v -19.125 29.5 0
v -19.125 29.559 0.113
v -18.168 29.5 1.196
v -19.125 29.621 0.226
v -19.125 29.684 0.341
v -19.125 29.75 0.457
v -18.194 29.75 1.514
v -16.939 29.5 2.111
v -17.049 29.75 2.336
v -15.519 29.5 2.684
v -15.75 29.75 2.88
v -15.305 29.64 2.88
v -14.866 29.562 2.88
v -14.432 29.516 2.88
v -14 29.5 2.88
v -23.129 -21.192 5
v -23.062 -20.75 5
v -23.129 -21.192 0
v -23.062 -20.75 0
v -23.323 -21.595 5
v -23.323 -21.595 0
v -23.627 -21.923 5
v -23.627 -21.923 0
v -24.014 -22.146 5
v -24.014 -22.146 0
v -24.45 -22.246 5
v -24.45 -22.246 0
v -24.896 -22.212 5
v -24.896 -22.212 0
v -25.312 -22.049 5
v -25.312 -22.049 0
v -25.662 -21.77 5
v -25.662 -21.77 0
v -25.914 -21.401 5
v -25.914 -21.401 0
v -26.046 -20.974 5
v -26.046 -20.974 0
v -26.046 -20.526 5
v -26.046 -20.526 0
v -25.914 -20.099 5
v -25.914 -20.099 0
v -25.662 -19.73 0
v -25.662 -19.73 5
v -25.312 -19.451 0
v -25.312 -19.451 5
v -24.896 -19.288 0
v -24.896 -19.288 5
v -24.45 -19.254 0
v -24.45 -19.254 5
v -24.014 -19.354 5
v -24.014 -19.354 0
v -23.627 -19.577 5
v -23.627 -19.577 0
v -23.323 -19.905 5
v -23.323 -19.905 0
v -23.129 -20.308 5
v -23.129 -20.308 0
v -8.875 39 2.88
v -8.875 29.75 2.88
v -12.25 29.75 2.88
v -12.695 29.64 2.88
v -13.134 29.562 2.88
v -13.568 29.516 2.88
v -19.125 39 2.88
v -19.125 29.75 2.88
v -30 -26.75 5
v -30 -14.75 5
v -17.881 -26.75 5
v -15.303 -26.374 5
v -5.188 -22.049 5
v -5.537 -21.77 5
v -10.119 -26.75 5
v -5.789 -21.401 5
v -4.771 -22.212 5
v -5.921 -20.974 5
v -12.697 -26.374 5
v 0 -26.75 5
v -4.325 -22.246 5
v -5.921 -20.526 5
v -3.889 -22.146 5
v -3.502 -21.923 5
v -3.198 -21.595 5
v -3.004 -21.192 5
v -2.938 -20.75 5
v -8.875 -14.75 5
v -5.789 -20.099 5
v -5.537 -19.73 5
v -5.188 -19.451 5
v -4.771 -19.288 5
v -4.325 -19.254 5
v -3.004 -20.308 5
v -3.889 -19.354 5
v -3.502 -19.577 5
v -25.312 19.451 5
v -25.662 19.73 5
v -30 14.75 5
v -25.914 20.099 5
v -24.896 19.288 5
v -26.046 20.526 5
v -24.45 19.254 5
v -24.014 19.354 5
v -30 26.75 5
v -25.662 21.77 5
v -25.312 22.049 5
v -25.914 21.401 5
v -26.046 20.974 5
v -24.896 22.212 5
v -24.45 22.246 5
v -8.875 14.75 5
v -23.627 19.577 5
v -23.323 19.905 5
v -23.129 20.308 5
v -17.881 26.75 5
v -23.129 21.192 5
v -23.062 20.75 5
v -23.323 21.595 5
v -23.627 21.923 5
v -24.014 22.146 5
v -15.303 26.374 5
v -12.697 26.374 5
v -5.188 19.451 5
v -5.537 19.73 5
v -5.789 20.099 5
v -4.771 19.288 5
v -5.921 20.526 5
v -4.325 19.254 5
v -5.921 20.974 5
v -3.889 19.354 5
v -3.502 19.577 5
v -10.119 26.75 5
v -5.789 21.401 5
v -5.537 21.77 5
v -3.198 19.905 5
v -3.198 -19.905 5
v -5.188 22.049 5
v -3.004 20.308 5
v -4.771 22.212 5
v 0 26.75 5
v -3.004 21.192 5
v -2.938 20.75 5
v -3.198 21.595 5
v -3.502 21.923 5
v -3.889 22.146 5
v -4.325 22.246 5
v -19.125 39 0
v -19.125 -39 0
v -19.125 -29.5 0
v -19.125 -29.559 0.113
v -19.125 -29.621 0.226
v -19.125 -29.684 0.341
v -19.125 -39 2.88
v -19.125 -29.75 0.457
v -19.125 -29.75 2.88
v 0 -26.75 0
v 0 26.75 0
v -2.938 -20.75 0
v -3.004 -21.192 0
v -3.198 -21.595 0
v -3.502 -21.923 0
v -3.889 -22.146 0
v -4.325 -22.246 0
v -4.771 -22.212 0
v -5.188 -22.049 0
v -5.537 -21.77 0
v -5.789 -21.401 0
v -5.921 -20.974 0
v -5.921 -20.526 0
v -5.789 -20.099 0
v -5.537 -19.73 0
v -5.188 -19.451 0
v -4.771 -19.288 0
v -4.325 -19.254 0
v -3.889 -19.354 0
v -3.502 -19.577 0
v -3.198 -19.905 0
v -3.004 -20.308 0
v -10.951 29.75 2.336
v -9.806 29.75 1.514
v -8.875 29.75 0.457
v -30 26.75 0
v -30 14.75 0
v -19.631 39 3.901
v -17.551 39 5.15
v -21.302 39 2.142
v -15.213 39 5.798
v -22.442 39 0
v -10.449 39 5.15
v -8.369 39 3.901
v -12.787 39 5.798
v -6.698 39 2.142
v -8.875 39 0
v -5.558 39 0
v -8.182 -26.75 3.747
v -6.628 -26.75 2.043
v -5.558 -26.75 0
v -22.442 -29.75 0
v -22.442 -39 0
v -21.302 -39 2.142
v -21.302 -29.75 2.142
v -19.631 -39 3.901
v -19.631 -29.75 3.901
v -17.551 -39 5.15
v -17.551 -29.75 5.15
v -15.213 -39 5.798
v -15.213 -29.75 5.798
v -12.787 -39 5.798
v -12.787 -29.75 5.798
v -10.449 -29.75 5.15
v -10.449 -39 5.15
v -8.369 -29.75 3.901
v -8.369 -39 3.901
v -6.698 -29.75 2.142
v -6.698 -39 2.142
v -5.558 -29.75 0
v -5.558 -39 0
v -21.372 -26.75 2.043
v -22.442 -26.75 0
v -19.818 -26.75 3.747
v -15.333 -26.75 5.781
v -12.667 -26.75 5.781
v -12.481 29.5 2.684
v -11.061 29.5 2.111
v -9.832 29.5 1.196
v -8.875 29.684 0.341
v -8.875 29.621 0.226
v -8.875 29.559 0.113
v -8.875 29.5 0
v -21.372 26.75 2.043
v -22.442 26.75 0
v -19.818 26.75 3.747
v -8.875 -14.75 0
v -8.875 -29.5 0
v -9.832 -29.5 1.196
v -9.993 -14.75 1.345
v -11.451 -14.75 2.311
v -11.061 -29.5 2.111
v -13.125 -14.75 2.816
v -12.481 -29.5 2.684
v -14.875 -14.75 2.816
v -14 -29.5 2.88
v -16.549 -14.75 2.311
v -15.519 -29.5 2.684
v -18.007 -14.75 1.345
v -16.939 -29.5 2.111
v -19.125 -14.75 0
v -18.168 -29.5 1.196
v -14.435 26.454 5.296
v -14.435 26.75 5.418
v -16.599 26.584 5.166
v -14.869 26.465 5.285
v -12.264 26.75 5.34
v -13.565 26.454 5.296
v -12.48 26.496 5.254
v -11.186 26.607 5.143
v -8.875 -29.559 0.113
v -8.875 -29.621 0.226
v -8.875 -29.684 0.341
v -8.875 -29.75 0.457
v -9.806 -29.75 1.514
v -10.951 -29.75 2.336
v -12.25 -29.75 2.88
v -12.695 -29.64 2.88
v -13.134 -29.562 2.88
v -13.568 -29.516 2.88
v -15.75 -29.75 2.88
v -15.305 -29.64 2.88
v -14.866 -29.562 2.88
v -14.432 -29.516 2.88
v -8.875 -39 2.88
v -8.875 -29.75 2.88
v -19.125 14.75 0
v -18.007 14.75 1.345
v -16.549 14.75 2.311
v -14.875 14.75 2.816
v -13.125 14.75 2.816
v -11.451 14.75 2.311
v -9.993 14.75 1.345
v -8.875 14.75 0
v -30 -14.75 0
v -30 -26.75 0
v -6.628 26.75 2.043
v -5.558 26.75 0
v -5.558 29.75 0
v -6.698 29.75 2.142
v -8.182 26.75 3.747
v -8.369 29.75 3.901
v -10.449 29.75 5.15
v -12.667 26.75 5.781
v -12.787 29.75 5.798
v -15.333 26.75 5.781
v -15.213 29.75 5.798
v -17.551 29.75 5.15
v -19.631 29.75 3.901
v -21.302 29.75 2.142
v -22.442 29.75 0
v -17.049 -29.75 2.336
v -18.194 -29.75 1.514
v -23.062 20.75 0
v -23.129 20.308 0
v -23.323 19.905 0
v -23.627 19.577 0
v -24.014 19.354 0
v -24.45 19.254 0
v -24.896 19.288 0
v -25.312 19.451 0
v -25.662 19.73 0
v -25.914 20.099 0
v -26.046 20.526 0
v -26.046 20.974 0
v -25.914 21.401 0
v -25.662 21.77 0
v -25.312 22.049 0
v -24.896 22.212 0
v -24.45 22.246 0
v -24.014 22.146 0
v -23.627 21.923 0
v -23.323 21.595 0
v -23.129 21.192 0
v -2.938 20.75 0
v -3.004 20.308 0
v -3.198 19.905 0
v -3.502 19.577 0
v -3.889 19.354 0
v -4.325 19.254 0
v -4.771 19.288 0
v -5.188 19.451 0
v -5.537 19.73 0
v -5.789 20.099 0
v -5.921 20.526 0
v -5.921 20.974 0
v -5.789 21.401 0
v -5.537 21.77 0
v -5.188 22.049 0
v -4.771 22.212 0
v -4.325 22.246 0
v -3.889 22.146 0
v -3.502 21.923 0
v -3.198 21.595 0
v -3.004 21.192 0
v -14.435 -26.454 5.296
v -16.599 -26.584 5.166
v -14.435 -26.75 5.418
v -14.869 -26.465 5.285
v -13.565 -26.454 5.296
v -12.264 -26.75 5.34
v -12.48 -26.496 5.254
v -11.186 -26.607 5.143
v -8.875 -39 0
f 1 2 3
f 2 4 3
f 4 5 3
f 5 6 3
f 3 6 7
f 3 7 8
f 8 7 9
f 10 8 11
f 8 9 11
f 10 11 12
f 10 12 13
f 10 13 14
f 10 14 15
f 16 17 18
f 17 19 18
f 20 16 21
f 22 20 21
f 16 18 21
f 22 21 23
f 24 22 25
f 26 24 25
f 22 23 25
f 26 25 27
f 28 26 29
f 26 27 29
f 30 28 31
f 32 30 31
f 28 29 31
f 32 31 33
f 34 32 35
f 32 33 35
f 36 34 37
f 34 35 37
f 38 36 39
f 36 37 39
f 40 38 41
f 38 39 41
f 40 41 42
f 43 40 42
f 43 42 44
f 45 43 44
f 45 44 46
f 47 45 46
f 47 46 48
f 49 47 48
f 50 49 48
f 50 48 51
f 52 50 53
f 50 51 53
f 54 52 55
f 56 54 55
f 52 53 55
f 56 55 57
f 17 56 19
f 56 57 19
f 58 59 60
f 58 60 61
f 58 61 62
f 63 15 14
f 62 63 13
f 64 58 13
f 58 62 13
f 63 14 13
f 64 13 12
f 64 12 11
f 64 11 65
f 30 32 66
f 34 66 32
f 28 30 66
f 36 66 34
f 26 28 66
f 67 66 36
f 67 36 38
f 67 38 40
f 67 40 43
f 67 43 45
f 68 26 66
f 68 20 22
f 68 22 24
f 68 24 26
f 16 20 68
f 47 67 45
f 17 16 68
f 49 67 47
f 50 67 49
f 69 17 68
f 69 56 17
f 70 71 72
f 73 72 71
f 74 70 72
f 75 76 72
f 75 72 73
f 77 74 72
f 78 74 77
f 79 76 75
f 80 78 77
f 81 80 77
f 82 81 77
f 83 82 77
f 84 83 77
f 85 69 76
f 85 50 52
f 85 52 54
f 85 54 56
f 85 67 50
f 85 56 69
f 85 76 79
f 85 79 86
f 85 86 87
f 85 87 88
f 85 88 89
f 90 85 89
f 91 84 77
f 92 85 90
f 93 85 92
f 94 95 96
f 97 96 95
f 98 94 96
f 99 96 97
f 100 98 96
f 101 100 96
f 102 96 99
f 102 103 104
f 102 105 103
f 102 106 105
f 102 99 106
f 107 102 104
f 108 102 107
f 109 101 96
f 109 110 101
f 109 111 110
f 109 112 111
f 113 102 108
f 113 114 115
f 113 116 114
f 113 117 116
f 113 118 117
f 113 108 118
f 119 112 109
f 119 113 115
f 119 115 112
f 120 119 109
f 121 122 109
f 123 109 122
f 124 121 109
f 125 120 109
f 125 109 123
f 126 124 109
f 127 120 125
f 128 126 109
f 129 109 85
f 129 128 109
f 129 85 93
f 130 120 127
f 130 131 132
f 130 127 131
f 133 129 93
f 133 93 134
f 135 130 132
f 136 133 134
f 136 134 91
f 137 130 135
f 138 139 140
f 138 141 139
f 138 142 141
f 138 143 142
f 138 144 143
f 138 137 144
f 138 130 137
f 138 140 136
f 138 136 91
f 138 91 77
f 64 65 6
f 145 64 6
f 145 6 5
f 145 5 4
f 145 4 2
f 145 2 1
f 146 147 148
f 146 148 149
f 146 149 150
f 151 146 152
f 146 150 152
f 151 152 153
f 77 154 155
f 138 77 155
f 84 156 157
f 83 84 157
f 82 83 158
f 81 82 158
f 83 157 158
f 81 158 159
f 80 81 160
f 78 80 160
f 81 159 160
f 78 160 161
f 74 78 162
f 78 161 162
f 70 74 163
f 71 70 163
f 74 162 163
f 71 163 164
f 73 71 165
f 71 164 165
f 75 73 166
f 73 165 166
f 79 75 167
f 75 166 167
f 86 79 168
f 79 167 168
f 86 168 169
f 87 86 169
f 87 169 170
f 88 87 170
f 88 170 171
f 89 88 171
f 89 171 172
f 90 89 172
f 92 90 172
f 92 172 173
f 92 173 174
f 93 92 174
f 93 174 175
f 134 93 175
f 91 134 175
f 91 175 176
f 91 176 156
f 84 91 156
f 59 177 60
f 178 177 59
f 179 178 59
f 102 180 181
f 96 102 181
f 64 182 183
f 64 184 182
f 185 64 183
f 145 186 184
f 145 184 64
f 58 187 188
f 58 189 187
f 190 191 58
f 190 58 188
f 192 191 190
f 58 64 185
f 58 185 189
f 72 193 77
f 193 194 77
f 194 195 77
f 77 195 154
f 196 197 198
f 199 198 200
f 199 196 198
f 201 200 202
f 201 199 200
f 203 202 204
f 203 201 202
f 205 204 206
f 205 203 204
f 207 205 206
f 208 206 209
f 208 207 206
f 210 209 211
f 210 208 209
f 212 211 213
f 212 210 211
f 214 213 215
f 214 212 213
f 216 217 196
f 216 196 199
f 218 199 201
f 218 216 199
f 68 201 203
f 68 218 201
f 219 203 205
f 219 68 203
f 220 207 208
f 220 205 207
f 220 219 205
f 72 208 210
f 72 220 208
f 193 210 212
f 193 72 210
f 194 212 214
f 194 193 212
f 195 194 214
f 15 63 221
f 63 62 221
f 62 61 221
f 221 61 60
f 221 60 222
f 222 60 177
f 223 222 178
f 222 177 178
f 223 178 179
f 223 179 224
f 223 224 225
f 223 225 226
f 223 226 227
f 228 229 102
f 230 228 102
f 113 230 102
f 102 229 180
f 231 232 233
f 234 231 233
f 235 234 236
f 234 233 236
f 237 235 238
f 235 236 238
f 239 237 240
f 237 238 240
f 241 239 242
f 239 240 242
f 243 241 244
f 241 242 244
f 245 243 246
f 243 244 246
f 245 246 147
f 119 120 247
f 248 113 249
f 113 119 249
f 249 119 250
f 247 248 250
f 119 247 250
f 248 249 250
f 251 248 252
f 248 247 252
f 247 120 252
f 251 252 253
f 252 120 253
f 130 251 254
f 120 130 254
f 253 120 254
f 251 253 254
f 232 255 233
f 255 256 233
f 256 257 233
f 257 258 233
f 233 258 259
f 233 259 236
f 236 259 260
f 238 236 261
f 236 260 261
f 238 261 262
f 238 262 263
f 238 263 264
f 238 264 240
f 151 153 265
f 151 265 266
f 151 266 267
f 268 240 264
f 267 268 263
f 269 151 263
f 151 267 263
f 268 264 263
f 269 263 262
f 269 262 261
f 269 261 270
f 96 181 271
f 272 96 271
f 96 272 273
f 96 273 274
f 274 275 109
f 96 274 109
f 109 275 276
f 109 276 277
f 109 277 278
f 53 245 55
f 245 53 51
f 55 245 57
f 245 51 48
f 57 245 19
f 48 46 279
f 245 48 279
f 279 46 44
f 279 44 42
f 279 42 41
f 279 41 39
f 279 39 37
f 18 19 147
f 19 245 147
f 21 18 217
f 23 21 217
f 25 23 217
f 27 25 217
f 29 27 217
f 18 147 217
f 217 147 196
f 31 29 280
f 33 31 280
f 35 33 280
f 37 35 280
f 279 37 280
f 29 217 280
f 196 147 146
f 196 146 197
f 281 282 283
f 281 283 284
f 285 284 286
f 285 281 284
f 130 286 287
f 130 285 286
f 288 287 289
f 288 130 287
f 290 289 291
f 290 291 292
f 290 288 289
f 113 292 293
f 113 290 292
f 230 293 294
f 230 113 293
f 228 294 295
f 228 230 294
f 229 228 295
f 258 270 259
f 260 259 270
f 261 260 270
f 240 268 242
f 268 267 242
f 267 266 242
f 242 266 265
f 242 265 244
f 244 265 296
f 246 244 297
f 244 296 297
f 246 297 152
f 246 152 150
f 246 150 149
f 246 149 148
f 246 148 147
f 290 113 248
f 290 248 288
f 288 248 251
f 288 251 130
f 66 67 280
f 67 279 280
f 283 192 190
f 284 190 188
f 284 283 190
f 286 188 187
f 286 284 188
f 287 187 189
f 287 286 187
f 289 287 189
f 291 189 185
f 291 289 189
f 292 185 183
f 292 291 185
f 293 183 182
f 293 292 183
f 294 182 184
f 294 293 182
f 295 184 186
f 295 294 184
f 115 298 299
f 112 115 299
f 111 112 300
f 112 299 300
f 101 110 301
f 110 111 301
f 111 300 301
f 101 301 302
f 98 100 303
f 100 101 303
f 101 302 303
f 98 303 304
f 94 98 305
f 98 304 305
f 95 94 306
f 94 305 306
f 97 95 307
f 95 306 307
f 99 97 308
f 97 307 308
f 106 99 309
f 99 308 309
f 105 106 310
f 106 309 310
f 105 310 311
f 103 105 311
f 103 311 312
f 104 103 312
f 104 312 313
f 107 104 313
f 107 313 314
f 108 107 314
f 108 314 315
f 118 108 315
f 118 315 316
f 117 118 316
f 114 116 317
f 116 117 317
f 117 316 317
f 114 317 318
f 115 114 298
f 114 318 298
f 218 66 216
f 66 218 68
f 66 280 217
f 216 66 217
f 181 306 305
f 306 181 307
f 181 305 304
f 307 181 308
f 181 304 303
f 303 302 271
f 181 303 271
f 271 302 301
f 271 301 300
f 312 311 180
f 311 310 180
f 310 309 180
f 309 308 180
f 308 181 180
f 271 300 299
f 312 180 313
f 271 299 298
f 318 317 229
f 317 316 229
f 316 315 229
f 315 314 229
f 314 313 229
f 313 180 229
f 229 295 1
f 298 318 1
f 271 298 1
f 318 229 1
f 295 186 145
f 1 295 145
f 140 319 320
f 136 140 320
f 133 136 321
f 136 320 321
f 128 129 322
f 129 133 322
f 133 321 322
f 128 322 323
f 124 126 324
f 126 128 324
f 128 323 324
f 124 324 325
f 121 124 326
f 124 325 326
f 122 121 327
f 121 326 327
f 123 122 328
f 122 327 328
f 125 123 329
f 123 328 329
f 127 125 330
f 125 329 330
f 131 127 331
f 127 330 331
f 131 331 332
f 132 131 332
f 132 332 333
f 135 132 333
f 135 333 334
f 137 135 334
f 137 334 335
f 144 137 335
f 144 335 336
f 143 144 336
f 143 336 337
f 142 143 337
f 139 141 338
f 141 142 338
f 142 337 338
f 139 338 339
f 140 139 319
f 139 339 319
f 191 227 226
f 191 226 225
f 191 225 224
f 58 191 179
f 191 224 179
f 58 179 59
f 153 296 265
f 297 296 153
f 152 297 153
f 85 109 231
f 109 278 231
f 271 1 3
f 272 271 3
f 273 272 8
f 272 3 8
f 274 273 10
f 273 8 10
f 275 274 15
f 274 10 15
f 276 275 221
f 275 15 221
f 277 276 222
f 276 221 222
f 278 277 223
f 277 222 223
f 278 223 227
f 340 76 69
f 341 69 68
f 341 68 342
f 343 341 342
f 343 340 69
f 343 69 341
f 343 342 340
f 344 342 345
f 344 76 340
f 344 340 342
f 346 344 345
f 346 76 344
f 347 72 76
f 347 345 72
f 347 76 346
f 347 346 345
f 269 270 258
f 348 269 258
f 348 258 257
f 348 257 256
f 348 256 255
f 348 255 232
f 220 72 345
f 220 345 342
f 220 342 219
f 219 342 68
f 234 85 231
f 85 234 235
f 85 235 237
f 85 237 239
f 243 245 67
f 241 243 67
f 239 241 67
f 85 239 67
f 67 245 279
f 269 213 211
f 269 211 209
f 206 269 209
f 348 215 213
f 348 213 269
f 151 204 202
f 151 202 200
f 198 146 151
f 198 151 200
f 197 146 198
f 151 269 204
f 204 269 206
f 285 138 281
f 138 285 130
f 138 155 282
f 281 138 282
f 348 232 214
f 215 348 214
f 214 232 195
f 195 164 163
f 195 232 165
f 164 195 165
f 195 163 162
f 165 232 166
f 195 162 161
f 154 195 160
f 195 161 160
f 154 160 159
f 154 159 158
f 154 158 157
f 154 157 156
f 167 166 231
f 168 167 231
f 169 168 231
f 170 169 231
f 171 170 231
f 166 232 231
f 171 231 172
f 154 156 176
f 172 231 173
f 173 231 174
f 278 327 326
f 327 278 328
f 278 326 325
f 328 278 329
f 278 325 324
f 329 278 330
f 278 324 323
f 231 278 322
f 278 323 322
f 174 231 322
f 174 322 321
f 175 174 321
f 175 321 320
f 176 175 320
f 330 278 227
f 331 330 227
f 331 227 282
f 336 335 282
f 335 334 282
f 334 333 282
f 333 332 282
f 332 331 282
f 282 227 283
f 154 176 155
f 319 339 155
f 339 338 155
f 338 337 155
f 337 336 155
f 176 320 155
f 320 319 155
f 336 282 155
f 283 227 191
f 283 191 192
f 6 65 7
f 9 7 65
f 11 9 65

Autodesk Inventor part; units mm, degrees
ref_plane "YZ Plane" through (0, 0, 0) normal (1, 0, 0) x (0, 1, 0)
ref_plane "XZ Plane" through (0, 0, 0) normal (0, 1, 0) x (-1, 0, 0)
ref_plane "XY Plane" through (0, 0, 0) normal (0, 0, 1) x (1, 0, 0)
sketch "Náčrt1" plane through (0, 0, 0) normal (0, 0, 1) x (1, 0, 0)
  line L0 (0, 0) -> (0, 26.75)
  line L1 (0, 26.75) -> (-30, 26.75)
  line L2 (-30, 26.75) -> (-30, 14.75)
  line L3 (-30, 14.75) -> (-8.875, 14.75)
  line L4 (-8.875, 14.75) -> (-8.875, 0)
  line L5 (-8.875, 0) -> (0, 0)
  circle A0 centre (-24.5625, 20.75) radius 1.5
  circle A1 centre (-4.4375, 20.75) radius 1.5
  line L6 (-19.125, 26.75) -> (-19.125, 14.75) construction
  dimension "d0" = 30
  dimension "d1" = 26.75
  dimension "d3" = 12
  dimension "d4" = 8.875
  dimension "d5" = 3
  dimension "d6" = 3
  dimension "d7" = 6
  dimension "d9" = 10.875
  dimension "d10" = 5.4375
  dimension "d11" = 4.4375
extrude "Vysunutí1" add sketch "Náčrt1" along normal blind 5
sketch "Náčrt2" plane through (-30, 26.75, 0) normal (0, 1, 0) x (1, 0, 0)
  circle A0 centre (16, 3.12) radius 6
  line L0 (30, 0) -> (0, 0) projected
  line L1 (21.125, 0) -> (21.125, -5) projected
  line L2 (30, -5) -> (0, -5) projected
  line L3 (10.875, -5) -> (10.875, 0)
  circle A1 centre (16, 3.12) radius 9
  point P0 (24.4419, 0)
  point P1 (7.5581, 0)
  dimension "d1" = 26.75
  dimension "d14" = 12
  dimension "d15" = 10.25
  dimension "d20" = 18
extrude "Vysunutí2" add sketch "Náčrt2" along normal blind 3 contours L3 A1 L0 | A0 L1 A1 L2 L3 | L0 A1 L1 | L2 A1
extrude "Vysunutí3" cut sketch "Náčrt2" against normal through all contours L0 A0 picked at (15.3305, -1.5618)
sketch "Náčrt3" plane through (0, 0, 5) normal (0, 0, 1) x (1, 0, 0)
  line L0 (-22.4419, 26.75) -> (-17.8815, 26.75) projected
  line L1 (0, 26.75) -> (-10.1185, 26.75) projected
  arc A0 (-17.8815, 26.75) -> (-10.1185, 26.75) centre (-14, 44.3265) ccw
  line L2 (-10.1185, 26.75) -> (-17.8815, 26.75) projected
  point P0 (0, 0)
  dimension "d21" = 18
revolve "Rotace1" add sketch "Náčrt3" angle 360 about axis through (-10.1185, 26.75, 5) along (-1, 0, 0)
sketch "Náčrt4" plane through (-30, 29.75, 0) normal (0, 1, 0) x (1, 0, 0)
  line L0 (21.125, 0) -> (21.125, -2.88)
  line L1 (21.125, 0) -> (21.125, -5) projected
  arc A0 (10.875, 0) -> (21.125, 0) centre (16, 3.12) ccw projected
  line L2 (10.875, -2.88) -> (10.875, 0)
  line L3 (21.125, -2.88) -> (10.875, -2.88)
  arc A1 (7.5581, 0) -> (24.4419, 0) centre (16, 3.12) ccw projected
  line L4 (24.4419, 0) -> (21.125, 0) projected
  line L5 (10.875, 0) -> (7.5581, 0) projected
  point P0 (30, 0)
extrude "Vysunutí4" add sketch "Náčrt4" along normal blind 9.25 contours L4 A1 L1 L0 | L1 A1 L5 L2 L3
chamfer "Zkosení1" distance 0.25 angle 45 2 edges at (-16.9394, 29.75, 2.1107) (-11.0606, 29.75, 2.1107)
mirror "Zrcadlit1" about plane through (-8.875, 0, 0) normal (0, -1, 0)
properties part number "joný=gej"
